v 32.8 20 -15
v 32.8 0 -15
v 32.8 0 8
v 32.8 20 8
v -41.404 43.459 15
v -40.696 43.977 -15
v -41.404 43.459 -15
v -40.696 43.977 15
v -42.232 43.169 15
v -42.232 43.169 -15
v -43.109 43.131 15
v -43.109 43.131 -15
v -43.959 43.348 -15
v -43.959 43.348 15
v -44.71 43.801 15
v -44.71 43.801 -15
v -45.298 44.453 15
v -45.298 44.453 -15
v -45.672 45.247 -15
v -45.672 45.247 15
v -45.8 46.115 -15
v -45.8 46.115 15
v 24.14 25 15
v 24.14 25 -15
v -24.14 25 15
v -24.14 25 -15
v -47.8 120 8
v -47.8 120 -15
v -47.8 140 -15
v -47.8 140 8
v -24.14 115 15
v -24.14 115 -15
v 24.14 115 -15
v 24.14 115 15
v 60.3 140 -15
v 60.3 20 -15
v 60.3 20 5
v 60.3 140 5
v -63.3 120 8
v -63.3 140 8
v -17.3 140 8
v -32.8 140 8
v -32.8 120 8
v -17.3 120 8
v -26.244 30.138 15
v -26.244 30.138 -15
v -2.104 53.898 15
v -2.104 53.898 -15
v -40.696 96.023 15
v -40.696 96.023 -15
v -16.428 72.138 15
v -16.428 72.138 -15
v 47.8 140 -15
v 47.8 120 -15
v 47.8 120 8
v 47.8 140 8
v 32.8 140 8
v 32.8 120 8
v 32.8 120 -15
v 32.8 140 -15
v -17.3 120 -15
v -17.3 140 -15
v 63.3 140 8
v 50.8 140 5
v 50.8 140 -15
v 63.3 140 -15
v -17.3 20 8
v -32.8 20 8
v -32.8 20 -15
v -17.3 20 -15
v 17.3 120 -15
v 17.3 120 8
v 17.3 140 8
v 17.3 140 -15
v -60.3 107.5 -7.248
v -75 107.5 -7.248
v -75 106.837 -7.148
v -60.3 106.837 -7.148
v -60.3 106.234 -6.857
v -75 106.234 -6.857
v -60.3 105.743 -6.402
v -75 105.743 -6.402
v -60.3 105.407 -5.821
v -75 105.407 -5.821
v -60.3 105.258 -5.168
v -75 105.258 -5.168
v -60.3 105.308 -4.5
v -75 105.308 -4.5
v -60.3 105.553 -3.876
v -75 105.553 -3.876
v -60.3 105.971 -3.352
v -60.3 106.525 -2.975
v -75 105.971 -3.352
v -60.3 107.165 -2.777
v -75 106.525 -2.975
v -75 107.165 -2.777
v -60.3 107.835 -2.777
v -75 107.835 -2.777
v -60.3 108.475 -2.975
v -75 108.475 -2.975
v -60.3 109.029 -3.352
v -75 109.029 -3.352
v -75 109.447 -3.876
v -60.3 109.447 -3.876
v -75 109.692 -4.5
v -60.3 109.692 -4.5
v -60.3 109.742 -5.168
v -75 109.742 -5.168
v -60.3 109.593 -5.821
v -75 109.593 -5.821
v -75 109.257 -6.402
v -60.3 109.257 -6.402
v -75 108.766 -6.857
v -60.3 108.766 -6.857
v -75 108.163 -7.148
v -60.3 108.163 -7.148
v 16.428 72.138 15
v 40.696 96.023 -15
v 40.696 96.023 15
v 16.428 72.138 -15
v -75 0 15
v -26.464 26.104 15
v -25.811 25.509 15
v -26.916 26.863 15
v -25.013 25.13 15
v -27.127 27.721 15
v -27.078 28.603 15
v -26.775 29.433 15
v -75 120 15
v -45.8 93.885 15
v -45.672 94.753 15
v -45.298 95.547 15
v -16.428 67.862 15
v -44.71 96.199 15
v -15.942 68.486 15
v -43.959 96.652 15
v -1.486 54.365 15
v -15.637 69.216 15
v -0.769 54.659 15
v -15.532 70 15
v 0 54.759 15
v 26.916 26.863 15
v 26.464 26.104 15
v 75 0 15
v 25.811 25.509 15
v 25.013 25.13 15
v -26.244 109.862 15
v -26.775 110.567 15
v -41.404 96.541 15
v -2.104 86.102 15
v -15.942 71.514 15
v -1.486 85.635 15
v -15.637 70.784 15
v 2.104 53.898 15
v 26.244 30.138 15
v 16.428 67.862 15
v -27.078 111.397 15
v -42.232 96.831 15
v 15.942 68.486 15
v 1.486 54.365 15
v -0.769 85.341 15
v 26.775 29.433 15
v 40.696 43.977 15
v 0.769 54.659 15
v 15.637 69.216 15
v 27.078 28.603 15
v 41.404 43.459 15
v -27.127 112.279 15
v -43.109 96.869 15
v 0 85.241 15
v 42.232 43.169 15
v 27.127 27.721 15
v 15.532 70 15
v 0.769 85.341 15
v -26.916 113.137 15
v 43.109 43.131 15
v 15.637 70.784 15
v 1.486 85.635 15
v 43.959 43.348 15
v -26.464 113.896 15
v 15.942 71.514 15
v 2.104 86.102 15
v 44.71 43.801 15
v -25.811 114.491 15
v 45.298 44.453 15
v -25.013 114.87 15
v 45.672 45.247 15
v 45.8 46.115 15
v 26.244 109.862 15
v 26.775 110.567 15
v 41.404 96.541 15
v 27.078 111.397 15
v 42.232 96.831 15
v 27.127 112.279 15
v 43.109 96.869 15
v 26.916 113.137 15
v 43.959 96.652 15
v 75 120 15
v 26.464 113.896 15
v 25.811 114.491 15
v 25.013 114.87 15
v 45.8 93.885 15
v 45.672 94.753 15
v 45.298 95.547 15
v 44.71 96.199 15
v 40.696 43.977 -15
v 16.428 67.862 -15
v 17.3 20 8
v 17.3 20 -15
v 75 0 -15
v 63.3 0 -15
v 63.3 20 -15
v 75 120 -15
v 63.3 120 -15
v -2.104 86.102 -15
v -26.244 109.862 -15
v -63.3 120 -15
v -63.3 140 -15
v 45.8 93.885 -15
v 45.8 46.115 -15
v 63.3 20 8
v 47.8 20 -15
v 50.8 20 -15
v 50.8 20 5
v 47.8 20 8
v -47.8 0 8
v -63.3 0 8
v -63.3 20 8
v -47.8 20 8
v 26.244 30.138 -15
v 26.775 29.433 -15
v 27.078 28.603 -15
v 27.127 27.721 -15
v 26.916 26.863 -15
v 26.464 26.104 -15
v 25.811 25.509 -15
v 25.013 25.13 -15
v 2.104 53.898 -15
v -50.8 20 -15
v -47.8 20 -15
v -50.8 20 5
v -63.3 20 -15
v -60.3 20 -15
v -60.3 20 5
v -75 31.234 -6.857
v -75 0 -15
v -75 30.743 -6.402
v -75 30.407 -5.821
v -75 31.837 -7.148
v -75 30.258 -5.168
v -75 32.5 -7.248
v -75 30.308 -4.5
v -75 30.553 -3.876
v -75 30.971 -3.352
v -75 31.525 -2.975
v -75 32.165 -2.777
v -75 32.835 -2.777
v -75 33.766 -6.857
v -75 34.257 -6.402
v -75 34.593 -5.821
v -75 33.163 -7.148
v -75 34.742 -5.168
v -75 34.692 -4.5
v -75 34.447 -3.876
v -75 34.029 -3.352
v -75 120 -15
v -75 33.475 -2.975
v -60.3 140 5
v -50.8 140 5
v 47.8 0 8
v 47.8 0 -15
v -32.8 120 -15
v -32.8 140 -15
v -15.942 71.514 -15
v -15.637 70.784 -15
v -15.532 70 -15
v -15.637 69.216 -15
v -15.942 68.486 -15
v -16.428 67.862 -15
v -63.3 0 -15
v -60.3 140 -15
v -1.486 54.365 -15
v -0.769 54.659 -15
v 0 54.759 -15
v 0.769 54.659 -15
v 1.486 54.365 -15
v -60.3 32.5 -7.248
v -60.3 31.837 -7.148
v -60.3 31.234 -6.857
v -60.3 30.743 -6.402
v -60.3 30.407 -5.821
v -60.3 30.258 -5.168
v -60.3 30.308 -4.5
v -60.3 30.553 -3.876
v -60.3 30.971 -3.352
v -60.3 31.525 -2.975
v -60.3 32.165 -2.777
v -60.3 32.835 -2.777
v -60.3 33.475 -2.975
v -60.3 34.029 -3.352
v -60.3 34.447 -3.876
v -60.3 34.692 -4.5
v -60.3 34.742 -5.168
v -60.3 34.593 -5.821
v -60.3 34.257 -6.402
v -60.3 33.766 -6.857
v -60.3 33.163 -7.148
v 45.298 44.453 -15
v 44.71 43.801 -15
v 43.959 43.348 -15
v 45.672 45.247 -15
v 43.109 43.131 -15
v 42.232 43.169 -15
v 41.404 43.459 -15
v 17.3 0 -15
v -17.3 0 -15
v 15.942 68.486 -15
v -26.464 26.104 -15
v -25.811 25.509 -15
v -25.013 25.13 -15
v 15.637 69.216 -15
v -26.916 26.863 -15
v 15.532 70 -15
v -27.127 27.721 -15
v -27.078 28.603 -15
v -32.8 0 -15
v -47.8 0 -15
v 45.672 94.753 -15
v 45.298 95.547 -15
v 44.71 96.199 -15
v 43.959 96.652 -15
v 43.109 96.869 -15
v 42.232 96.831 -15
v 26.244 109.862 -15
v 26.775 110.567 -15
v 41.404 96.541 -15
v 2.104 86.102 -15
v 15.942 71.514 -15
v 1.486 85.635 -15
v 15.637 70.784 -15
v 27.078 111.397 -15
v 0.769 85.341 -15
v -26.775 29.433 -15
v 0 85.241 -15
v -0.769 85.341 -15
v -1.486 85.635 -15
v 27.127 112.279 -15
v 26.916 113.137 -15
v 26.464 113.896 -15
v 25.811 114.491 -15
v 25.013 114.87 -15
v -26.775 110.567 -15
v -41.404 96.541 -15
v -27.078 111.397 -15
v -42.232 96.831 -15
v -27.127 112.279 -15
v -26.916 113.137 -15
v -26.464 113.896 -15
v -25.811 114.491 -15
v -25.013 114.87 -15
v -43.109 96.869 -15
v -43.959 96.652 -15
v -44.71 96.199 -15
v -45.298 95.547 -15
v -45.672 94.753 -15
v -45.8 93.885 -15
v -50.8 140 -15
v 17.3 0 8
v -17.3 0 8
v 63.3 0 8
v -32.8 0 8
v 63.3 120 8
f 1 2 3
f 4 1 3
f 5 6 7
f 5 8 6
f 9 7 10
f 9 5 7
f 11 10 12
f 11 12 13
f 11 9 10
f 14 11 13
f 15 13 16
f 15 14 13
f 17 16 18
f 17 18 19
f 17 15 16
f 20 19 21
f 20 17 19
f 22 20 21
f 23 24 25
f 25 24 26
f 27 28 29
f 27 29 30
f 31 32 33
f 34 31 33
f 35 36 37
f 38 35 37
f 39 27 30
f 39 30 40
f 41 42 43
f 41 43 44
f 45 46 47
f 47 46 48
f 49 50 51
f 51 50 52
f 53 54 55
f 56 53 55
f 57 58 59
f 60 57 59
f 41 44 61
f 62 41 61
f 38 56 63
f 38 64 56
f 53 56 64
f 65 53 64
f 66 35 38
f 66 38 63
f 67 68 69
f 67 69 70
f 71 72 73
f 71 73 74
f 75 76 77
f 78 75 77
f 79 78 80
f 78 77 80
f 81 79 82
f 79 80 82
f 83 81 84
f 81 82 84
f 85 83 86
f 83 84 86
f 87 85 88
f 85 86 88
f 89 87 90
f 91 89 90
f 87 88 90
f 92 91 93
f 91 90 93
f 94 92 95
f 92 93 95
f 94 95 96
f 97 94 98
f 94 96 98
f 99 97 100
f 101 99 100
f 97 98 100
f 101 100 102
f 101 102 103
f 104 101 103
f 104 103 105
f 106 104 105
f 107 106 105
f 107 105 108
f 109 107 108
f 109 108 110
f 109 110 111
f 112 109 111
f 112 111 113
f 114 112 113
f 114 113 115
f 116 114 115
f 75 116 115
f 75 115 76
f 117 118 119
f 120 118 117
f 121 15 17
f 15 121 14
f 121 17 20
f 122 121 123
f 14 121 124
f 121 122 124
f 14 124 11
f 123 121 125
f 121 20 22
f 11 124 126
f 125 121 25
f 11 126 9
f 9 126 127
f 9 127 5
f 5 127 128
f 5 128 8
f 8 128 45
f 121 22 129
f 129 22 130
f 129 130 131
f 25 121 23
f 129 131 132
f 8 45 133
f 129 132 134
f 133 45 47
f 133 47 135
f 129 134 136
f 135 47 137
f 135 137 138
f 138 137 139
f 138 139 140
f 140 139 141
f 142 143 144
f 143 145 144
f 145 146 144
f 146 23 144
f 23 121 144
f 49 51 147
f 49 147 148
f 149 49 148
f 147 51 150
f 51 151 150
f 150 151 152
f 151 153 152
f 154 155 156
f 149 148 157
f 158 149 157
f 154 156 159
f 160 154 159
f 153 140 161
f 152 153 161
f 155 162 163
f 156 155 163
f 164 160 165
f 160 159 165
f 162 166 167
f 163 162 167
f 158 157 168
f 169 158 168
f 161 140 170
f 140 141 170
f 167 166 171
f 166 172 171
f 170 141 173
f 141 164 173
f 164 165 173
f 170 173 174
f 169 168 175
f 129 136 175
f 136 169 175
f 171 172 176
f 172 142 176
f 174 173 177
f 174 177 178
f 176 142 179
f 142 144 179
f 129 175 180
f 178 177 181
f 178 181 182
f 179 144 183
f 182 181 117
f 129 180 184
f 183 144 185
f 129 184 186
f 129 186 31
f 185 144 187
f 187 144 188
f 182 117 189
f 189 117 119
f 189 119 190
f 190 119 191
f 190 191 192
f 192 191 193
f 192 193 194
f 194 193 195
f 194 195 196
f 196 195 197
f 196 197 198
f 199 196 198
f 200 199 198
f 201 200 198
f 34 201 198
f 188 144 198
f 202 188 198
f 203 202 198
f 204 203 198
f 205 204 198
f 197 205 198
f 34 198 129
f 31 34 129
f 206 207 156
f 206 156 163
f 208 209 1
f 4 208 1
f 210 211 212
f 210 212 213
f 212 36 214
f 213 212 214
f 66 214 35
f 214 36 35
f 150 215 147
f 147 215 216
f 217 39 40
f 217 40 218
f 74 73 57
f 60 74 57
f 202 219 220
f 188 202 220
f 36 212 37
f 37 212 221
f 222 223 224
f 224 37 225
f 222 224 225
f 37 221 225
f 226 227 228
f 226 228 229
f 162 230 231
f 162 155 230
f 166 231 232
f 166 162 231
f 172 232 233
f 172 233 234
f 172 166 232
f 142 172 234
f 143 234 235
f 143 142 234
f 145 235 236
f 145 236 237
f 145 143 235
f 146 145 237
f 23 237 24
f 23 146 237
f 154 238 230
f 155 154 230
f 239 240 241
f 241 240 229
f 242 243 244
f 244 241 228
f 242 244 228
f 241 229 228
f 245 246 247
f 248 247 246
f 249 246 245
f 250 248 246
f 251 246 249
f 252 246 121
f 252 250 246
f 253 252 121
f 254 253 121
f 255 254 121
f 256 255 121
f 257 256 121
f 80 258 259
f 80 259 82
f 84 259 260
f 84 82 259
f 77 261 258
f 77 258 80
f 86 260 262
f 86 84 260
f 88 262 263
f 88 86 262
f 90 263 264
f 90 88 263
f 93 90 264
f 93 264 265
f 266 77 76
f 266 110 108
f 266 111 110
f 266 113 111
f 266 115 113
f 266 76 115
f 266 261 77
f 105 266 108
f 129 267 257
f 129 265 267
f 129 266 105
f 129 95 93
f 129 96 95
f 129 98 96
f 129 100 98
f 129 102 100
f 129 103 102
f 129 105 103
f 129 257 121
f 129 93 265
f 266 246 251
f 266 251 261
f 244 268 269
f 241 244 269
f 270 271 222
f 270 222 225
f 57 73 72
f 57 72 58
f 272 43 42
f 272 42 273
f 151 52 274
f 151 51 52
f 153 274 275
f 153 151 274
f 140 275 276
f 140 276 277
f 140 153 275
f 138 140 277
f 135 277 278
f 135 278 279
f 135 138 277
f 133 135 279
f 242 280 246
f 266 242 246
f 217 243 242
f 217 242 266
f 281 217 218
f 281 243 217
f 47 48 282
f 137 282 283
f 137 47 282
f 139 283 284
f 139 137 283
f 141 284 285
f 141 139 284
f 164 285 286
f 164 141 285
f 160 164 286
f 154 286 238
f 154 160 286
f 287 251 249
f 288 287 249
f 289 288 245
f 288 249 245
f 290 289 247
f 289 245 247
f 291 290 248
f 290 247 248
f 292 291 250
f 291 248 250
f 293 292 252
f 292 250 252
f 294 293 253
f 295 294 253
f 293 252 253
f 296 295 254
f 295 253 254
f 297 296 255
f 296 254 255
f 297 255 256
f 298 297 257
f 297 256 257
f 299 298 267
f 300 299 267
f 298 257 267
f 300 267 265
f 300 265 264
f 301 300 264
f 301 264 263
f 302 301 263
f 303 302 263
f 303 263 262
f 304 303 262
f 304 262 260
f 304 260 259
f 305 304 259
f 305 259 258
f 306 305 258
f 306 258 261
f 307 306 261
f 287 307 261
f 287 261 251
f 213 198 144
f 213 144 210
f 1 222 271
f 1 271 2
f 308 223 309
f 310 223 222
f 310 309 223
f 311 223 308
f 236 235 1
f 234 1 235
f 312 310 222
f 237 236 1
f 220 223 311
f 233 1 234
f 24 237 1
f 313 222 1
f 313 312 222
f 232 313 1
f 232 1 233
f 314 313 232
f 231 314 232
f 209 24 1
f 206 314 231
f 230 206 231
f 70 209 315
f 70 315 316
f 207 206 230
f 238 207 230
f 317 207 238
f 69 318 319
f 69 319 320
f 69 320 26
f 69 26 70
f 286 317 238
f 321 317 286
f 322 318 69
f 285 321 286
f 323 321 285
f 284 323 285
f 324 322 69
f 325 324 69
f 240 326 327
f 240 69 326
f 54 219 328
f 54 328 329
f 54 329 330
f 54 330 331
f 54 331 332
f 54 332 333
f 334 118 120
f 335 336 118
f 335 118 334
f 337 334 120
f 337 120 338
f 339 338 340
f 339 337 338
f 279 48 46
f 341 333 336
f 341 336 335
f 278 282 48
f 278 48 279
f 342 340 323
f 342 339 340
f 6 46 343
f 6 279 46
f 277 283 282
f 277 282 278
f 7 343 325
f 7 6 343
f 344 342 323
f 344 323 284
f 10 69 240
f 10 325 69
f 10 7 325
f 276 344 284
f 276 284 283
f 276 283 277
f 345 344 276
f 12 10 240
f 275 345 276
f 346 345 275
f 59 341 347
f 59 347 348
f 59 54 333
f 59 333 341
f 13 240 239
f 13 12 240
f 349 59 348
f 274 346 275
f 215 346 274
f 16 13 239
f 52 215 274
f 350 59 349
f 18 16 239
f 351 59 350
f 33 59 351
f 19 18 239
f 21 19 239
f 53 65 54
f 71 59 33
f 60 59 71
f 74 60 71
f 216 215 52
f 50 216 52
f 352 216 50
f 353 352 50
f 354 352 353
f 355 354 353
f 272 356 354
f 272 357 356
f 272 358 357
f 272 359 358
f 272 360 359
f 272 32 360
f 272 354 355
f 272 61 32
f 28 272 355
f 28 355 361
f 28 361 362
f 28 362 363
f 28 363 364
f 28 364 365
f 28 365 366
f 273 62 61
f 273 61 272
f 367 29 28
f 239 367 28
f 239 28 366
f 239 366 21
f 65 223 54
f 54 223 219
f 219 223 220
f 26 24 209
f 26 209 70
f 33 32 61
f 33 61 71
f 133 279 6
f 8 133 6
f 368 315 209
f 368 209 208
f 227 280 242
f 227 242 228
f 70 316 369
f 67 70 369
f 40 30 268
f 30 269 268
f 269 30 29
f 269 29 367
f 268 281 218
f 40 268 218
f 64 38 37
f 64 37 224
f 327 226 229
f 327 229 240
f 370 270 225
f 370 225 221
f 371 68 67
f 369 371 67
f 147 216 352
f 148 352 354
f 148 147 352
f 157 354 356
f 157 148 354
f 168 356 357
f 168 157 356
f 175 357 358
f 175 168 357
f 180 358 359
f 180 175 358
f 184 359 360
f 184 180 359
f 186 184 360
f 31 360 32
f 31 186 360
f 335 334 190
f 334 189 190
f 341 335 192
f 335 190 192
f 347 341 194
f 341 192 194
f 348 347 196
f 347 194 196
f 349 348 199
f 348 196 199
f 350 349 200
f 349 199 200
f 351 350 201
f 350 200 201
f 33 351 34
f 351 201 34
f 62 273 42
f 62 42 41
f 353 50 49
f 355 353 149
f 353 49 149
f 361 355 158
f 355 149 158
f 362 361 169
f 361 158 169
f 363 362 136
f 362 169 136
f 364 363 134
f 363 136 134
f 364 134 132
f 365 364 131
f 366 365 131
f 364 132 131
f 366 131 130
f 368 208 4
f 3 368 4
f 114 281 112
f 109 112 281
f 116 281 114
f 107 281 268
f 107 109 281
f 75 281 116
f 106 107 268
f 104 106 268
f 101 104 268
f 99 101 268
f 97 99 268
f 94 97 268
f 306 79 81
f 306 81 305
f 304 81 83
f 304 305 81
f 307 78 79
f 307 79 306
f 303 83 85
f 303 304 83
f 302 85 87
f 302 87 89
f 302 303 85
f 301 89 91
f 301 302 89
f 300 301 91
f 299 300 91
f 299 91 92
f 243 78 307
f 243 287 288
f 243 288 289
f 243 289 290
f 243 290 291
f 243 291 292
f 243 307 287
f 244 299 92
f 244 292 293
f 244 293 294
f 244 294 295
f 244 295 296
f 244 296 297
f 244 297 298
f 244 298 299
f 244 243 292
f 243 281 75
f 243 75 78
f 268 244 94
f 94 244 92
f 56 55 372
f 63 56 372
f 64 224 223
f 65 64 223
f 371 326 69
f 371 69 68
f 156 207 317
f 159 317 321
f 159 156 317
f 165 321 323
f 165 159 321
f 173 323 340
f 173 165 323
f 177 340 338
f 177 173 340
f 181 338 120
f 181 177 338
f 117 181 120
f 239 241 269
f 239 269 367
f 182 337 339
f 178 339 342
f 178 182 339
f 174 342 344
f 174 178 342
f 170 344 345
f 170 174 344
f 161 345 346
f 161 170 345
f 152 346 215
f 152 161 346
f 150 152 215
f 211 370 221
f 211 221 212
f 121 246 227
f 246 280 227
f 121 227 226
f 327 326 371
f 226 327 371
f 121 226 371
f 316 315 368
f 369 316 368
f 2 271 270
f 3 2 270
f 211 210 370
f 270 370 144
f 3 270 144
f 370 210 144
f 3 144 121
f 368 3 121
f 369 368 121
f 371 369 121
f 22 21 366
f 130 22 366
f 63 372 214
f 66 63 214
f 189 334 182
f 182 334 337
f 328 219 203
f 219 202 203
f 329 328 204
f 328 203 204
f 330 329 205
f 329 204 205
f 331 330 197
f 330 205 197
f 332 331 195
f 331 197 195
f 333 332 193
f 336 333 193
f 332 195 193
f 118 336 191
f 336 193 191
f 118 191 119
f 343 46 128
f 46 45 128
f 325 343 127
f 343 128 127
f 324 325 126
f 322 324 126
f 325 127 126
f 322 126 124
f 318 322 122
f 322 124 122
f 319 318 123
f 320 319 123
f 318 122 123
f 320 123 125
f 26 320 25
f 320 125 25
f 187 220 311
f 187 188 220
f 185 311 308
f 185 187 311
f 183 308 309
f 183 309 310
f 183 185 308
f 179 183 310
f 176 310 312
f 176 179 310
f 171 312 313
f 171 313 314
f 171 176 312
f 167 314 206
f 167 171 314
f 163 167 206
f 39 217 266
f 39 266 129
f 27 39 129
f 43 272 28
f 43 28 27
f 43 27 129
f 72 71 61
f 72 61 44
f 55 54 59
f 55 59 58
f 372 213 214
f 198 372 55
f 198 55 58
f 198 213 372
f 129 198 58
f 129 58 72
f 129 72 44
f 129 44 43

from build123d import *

# Parameters (mm, degrees)
BOSS_EXTRUDE1_DEPTH        = 120
BOSS_EXTRUDE2_DEPTH        = 20
CUT_EXTRUDE1_DEPTH         = 20
SKETCH17_W                 = 82.2
SKETCH17_H                 = 120
BOSS_EXTRUDE3_DEPTH        = 20
SKETCH18_W                 = 15.5
SKETCH18_H                 = 23
CUT_EXTRUDE2_DEPTH         = 20
SKETCH19_W                 = 15.5
SKETCH19_H                 = 23
BOSS_EXTRUDE4_DEPTH        = 20
CUT_EXTRUDE3_DEPTH         = 37
FILLET3_R                  = 3
SKETCH22_W                 = 30
SKETCH22_H                 = 120
BOSS_EXTRUDE5_DEPTH        = 5
SKETCH23_W                 = 30
SKETCH23_H                 = 120
BOSS_EXTRUDE6_DEPTH        = 5
F_8_CLEARANCE_HOLE1_REACH  = 187.624
F_8_CLEARANCE_HOLE1_BORE_R = 2.2479


with BuildPart() as part:
    # Sketch1 → Boss-Extrude1 (new body)
    with BuildSketch(Plane(origin=(0, 0, 0), x_dir=(1, 0, 0), z_dir=(0, 1, 0))):
        Polygon((-70, 15), (-70, -15), (70, -15), (70, 15), (60.3, 15), (60.3, -5), (50.8, -5), (50.8, 15), (41.1, 15), (41.1, -5), (-41.1, -5), (-41.1, 15), (-50.8, 15), (-50.8, -5), (-60.3, -5), (-60.3, 15), align=None)
    extrude(amount=BOSS_EXTRUDE1_DEPTH)

    # Sketch2 → Boss-Extrude2 (add)
    with BuildSketch(Plane(origin=(0, 120, 0), x_dir=(1, 0, 0), z_dir=(0, 1, 0))):
        Polygon((-63.3, -8), (-63.3, 15), (-60.3, 15), (-60.3, -5), (-50.8, -5), (-50.8, 15), (-47.8, 15), (-47.8, -8), align=None)
        Polygon((63.3, -8), (63.3, 15), (60.3, 15), (60.3, -5), (50.8, -5), (50.8, 15), (47.8, 15), (47.8, -8), align=None)
    extrude(amount=BOSS_EXTRUDE2_DEPTH)

    # Sketch3 → Cut-Extrude1 (cut)
    with BuildSketch(Plane.XZ):
        Polygon((-47.8, 8), (-47.8, -15), (-50.8, -15), (-50.8, 5), (-60.3, 5), (-60.3, -15), (-63.3, -15), (-63.3, 8), align=None)
        Polygon((63.3, 8), (63.3, -15), (60.3, -15), (60.3, 5), (50.8, 5), (50.8, -15), (47.8, -15), (47.8, 8), align=None)
    extrude(amount=-CUT_EXTRUDE1_DEPTH, mode=Mode.SUBTRACT)

    # Sketch17 → Boss-Extrude3 (add)
    with BuildSketch(Plane(origin=(0, 0, 5), x_dir=(-1, 0, 0), z_dir=(0, 0, -1))):
        with Locations((0, 60)):
            Rectangle(SKETCH17_W, SKETCH17_H)
    extrude(amount=BOSS_EXTRUDE3_DEPTH)

    # Sketch18 → Cut-Extrude2 (cut)
    with BuildSketch(Plane.XZ):
        with Locations((-25.05, -3.5)):
            Rectangle(SKETCH18_W, SKETCH18_H)
        with Locations((25.05, -3.5)):
            Rectangle(SKETCH18_W, SKETCH18_H)
    extrude(amount=-CUT_EXTRUDE2_DEPTH, mode=Mode.SUBTRACT)

    # Sketch19 → Boss-Extrude4 (add)
    with BuildSketch(Plane(origin=(0, 120, 0), x_dir=(1, 0, 0), z_dir=(0, 1, 0))):
        with Locations((-25.05, 3.5)):
            Rectangle(SKETCH19_W, SKETCH19_H)
        with Locations((25.05, 3.5)):
            Rectangle(SKETCH19_W, SKETCH19_H)
    extrude(amount=BOSS_EXTRUDE4_DEPTH)

    # Sketch20 → Cut-Extrude3 (cut)
    with BuildSketch(Plane(origin=(0, 0, -15), x_dir=(-1, 0, 0), z_dir=(0, 0, -1))):
        Polygon((0, 25), (31.464278342, 25), (0, 55.968777895), (-31.464278342, 25), align=None)
        Polygon((45.8, 70), (45.8, 101.047518053), (14.255721658, 70), (45.8, 38.952481947), align=None)
        Polygon((0, 115), (-31.464278342, 115), (0, 84.031222105), (31.464278342, 115), align=None)
        Polygon((-45.8, 70), (-45.8, 101.047518053), (-14.255721658, 70), (-45.8, 38.952481947), align=None)
    extrude(amount=-CUT_EXTRUDE3_DEPTH, mode=Mode.SUBTRACT)

    # Fillet3
    fillet3_edges = [part.edges().sort_by_distance(p)[0] for p in [
        (-31.464278342, 115, 0),
        (0, 84.031222105, 0),
        (31.464278342, 115, 0),
        (-45.8, 38.952481947, 0),
        (-14.255721658, 70, 0),
        (-45.8, 101.047518053, 0),
        (45.8, 38.952481947, 0),
        (45.8, 101.047518053, 0),
        (14.255721658, 70, 0),
        (31.464278342, 25, 0),
        (0, 55.968777895, 0),
        (-31.464278342, 25, 0),
    ]]
    fillet(fillet3_edges, radius=FILLET3_R)

    # Sketch22 → Boss-Extrude5 (add)
    with BuildSketch(Plane(origin=(70, 0, 0), x_dir=(0, 0, -1), z_dir=(1, 0, 0))):
        with Locations((0, 60)):
            Rectangle(SKETCH22_W, SKETCH22_H)
    extrude(amount=BOSS_EXTRUDE5_DEPTH)

    # Sketch23 → Boss-Extrude6 (add)
    with BuildSketch(Plane.ZY.offset(70)):
        with Locations((0, 60)):
            Rectangle(SKETCH23_W, SKETCH23_H)
    extrude(amount=BOSS_EXTRUDE6_DEPTH)

    # #8 Clearance Hole1 bore (on position points) → #8 Clearance Hole1 (cut, up to next)
    with BuildSketch(Plane(origin=(-75, 107.5, -5), x_dir=(0, 0, -1), z_dir=(-1, 0, 0)), mode=Mode.PRIVATE) as f_8_clearance_hole1_sk1:
        Circle(F_8_CLEARANCE_HOLE1_BORE_R)
    f_8_clearance_hole1_tool1 = extrude(f_8_clearance_hole1_sk1.sketch, amount=-F_8_CLEARANCE_HOLE1_REACH, mode=Mode.PRIVATE) & part.part
    # #8 Clearance Hole1 bore (on position points) → #8 Clearance Hole1 (cut, up to next)
    with BuildSketch(Plane(origin=(-75, 107.5, -5), x_dir=(0, 0, -1), z_dir=(-1, 0, 0)), mode=Mode.PRIVATE) as f_8_clearance_hole1_sk2:
        with Locations((0, 75)):
            Circle(F_8_CLEARANCE_HOLE1_BORE_R)
    f_8_clearance_hole1_tool2 = extrude(f_8_clearance_hole1_sk2.sketch, amount=-F_8_CLEARANCE_HOLE1_REACH, mode=Mode.PRIVATE) & part.part
    add(f_8_clearance_hole1_tool1.solids().sort_by_distance((-75, 107.5, -5))[0], mode=Mode.SUBTRACT)
    add(f_8_clearance_hole1_tool2.solids().sort_by_distance((-75, 32.5, -5))[0], mode=Mode.SUBTRACT)


solid = part.part
